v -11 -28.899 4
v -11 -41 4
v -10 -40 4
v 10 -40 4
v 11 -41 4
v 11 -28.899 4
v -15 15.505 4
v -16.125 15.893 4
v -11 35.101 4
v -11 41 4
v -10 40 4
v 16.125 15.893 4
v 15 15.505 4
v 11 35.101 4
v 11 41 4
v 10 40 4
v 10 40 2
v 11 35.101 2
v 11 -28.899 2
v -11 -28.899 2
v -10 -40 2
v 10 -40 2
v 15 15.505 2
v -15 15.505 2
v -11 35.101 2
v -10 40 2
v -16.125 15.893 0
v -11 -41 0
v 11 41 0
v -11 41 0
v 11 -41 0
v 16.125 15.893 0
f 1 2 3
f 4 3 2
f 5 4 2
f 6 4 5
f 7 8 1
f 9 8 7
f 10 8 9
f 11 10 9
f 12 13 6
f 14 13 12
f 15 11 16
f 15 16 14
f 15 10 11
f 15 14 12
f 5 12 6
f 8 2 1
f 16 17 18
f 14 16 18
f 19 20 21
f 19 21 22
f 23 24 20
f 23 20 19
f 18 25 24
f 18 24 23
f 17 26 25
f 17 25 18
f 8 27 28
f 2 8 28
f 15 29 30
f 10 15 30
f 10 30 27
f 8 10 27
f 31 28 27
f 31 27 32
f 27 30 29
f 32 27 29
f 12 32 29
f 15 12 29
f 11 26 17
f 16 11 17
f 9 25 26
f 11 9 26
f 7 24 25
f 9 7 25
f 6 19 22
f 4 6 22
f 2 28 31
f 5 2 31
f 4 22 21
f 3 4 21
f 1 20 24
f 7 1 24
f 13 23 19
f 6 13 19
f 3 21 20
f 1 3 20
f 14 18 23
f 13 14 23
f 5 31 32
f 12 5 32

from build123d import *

# Parameters (mm, degrees)
F0_W     = 20
F0_H     = 80
F1_DEPTH = 2
F2_DEPTH = 4


with BuildPart() as f1:
    # F0 (on Top) → F1 (new body)
    with BuildSketch(Plane.XY):
        Polygon((-11, -28.898979), (-11, 35.101021), (-15, 15.505103), align=None)
        Rectangle(F0_W, F0_H)
        Polygon((15, 15.505103), (11, 35.101021), (11, -28.898979), align=None)
        Polygon((11, 35.101021), (10, 40), (10, -40), (11, -28.898979), align=None)
        Polygon((-10, -40), (-10, 40), (-11, 35.101021), (-11, -28.898979), align=None)
    extrude(amount=F1_DEPTH)

    # F0 (on Top) → F2 (join)
    with BuildSketch(Plane.XY):
        Polygon((-15, 15.505103), (-11, 35.101021), (-11, 41), (-16.125, 15.89273), (-11, -41), (-11, -28.898979), align=None)
        Polygon((-10, 40), (10, 40), (11, 35.101021), (11, 41), (-11, 41), (-11, 35.101021), align=None)
        Polygon((11, 41), (11, 35.101021), (15, 15.505103), (11, -28.898979), (11, -41), (16.125, 15.89273), align=None)
        Polygon((11, -28.898979), (10, -40), (-10, -40), (-11, -28.898979), (-11, -41), (11, -41), align=None)
    extrude(amount=F2_DEPTH)


solid = f1.part
